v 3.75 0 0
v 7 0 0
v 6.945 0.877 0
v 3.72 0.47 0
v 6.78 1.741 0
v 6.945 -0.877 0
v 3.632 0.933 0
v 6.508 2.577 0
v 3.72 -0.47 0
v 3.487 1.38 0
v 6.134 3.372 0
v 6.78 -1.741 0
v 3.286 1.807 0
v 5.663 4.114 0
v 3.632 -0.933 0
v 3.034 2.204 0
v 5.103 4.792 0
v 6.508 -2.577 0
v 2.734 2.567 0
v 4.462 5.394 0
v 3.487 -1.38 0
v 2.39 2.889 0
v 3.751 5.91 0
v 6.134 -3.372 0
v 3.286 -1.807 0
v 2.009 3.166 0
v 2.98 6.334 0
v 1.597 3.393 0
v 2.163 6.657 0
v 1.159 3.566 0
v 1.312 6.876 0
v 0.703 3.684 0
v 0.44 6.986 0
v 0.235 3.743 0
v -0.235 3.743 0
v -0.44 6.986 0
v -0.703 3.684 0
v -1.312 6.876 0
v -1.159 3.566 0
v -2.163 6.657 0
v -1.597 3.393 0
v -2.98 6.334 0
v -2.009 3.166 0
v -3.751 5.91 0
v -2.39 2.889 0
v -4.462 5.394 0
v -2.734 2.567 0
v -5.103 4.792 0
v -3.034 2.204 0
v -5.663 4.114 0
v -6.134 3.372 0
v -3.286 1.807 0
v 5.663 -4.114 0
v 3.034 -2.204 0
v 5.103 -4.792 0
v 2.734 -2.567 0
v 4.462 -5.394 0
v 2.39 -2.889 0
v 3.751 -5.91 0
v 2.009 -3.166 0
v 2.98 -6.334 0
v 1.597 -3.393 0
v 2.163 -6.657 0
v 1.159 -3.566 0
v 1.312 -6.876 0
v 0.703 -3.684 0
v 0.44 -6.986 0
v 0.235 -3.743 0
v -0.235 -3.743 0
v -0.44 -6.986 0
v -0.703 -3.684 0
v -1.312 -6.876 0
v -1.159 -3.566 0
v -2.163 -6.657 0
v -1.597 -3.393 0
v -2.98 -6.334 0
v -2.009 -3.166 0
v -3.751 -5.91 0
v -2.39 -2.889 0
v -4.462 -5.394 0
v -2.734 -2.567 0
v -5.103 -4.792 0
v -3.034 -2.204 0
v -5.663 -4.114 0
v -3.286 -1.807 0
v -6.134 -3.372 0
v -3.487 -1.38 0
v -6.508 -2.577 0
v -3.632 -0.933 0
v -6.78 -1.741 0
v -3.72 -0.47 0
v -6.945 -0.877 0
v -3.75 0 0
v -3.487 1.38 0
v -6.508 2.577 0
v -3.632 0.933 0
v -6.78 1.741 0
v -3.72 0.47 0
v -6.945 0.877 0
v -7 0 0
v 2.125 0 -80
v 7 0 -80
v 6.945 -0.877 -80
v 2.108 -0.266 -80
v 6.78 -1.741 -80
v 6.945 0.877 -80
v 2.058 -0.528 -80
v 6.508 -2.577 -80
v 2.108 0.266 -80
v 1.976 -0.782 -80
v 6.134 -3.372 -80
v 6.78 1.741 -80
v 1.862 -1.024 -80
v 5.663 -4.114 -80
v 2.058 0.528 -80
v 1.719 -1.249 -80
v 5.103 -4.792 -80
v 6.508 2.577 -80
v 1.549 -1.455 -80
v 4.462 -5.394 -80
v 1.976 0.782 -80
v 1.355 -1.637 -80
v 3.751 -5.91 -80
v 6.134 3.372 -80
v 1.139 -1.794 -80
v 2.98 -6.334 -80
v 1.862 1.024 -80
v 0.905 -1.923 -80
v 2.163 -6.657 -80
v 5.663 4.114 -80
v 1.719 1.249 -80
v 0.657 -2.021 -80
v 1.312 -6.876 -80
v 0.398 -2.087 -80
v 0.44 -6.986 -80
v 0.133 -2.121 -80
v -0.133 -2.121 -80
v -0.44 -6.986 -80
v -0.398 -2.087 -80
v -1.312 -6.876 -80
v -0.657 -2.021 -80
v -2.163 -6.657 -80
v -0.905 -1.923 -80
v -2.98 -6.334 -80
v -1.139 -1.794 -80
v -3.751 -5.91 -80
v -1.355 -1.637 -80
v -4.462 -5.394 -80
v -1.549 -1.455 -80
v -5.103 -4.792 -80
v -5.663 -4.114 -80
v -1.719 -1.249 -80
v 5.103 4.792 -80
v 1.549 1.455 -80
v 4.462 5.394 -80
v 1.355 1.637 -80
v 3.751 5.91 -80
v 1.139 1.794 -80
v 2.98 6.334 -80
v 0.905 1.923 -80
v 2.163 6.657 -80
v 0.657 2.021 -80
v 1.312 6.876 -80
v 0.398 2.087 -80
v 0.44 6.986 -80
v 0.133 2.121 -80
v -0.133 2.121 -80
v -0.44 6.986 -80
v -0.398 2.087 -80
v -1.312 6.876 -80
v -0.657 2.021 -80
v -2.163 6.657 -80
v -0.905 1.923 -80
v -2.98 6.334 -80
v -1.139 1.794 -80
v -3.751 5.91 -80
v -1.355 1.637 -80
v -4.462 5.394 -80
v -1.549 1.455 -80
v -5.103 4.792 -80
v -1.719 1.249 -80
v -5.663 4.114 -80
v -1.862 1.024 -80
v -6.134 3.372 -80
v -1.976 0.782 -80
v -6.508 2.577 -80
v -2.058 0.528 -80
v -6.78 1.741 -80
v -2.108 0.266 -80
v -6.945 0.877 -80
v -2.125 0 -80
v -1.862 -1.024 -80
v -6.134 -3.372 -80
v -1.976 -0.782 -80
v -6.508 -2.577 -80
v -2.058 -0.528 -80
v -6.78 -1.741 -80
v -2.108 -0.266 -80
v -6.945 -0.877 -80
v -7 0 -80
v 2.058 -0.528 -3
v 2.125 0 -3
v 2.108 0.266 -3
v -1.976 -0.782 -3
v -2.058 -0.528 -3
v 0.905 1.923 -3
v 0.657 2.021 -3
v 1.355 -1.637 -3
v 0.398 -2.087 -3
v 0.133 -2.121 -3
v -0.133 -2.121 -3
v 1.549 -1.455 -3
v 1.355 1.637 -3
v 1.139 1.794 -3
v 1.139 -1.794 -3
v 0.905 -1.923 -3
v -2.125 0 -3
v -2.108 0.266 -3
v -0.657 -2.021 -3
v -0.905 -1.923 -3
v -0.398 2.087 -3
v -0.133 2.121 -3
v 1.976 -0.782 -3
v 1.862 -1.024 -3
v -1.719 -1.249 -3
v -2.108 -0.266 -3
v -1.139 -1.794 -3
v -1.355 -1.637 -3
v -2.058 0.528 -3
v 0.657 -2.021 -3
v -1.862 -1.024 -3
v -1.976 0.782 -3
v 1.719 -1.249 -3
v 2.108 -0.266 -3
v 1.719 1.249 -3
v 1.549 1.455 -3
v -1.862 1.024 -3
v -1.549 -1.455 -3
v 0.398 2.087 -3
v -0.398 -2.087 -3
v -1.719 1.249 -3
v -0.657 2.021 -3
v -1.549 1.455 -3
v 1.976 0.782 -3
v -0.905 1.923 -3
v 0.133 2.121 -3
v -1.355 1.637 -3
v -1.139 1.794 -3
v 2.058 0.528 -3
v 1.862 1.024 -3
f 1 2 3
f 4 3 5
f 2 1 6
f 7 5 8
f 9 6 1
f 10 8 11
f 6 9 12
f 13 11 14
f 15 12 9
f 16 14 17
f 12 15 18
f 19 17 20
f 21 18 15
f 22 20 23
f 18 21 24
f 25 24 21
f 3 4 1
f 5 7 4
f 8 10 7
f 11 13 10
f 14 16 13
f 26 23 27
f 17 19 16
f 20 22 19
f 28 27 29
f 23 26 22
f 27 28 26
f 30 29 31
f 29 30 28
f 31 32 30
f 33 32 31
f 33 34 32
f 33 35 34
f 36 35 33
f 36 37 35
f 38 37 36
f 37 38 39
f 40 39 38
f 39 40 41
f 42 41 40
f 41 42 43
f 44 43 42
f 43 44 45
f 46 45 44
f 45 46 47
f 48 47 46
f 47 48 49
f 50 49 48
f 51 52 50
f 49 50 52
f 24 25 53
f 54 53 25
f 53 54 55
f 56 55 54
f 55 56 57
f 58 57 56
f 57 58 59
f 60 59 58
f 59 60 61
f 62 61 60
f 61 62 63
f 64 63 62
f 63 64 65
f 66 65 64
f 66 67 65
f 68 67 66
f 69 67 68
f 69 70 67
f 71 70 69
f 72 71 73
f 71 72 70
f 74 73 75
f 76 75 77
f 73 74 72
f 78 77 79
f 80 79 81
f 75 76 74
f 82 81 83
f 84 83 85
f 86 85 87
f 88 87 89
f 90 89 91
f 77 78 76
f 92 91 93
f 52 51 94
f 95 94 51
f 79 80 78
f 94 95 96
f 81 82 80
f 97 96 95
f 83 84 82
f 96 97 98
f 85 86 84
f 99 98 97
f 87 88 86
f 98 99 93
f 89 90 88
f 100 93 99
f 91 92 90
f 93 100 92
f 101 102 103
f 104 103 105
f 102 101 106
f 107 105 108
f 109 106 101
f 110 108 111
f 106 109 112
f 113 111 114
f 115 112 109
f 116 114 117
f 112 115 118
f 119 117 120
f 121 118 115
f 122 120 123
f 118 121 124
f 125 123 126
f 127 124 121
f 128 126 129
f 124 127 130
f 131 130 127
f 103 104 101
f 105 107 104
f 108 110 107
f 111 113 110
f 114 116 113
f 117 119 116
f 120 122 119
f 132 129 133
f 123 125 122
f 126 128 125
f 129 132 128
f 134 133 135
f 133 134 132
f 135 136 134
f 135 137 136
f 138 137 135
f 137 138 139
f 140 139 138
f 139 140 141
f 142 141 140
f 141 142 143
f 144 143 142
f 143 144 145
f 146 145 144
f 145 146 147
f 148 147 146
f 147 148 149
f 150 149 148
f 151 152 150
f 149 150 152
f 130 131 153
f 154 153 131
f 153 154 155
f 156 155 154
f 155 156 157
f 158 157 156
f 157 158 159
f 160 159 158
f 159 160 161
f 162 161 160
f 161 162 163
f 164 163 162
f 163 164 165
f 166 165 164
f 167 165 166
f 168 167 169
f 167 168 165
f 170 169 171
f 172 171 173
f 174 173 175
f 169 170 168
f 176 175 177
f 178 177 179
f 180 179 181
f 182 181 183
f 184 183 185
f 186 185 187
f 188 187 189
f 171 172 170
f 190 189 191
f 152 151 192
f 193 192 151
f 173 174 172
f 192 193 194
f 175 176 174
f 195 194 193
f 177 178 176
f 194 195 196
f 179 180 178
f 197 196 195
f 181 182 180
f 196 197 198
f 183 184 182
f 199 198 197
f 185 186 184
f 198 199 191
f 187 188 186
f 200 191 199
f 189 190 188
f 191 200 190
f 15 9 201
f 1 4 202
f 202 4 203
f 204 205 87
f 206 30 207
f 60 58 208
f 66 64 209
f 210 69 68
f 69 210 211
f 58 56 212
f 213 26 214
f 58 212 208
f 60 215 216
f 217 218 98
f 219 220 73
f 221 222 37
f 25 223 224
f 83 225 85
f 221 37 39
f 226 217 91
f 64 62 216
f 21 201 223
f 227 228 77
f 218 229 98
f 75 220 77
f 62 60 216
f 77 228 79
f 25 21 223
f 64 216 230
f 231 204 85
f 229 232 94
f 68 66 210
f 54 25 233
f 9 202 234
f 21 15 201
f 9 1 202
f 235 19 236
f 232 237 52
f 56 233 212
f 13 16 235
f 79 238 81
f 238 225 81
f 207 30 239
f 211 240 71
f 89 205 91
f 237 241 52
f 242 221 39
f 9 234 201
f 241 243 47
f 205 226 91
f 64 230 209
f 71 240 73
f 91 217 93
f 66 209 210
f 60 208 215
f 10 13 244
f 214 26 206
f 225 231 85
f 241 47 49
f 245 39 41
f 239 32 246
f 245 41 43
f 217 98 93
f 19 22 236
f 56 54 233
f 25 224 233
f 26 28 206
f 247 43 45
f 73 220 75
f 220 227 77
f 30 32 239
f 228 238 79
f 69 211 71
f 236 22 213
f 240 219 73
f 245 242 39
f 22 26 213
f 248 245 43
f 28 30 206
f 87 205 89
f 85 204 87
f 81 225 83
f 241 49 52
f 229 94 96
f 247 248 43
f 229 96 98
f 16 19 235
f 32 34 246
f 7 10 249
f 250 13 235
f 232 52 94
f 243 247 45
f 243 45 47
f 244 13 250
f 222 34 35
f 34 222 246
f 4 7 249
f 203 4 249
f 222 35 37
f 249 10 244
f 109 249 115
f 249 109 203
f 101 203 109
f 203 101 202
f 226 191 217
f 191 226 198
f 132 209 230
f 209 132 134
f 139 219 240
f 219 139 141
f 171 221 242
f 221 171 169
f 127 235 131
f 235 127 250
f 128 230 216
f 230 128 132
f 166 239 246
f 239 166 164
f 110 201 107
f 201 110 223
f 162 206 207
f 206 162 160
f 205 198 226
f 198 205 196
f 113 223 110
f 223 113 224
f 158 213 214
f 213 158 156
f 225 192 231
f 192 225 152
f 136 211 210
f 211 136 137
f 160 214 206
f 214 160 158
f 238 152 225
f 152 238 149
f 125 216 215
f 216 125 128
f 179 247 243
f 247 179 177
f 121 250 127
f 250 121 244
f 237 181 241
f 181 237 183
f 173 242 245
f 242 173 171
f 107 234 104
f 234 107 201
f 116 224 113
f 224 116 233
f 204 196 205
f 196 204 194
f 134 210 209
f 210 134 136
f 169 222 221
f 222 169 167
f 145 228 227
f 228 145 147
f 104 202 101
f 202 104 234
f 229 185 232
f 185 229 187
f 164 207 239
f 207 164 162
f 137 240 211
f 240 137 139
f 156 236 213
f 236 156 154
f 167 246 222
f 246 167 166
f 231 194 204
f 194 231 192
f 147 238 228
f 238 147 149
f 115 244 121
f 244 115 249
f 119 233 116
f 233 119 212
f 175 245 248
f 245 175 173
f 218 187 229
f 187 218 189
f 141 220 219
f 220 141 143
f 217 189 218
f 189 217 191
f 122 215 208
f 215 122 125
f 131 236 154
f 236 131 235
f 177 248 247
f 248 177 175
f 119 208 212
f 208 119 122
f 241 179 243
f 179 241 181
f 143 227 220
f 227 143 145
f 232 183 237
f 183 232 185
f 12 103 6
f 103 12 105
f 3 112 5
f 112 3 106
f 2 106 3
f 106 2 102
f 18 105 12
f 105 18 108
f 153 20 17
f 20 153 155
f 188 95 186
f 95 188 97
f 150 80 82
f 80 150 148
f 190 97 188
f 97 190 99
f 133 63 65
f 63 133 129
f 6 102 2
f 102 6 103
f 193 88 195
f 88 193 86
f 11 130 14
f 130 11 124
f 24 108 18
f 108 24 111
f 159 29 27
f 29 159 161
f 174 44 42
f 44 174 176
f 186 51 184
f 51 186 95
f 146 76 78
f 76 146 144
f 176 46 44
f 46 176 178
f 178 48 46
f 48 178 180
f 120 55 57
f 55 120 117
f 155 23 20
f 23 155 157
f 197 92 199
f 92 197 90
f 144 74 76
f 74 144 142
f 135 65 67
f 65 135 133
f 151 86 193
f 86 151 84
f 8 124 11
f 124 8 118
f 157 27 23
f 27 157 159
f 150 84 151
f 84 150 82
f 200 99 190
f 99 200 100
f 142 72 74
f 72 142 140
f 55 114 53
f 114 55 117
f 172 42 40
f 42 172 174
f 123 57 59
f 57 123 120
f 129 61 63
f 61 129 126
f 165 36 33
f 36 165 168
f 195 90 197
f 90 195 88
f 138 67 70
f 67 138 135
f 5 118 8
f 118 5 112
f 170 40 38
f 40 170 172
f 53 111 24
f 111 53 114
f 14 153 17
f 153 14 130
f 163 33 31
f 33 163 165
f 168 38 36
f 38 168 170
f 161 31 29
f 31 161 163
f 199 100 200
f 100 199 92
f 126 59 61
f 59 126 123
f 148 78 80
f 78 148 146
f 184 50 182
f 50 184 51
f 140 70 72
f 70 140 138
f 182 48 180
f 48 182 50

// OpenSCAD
$fn = 50;


difference() {
	union() {
		translate(v = [0, 0, -80.0000000000]) {
			cylinder(h = 80, r = 7.0000000000);
		}
		cylinder(h = 0, r = 16.0000000000);
	}
	union() {
		translate(v = [0, 0, 0]) {
			rotate(a = [0, 0, 0]) {
				difference() {
					union() {
						#translate(v = [0, 0, -80.0000000000]) {
							cylinder(h = 80, r = 2.0000000000);
						}
						#translate(v = [0, 0, -3]) {
							cylinder(h = 3, r1 = 2.1250000000, r2 = 3.7500000000);
						}
						#translate(v = [0, 0, -80.0000000000]) {
							cylinder(h = 80, r = 2.1250000000);
						}
						#translate(v = [0, 0, -80.0000000000]) {
							cylinder(h = 80, r = 2.0000000000);
						}
					}
					union();
				}
			}
		}
	}
}
